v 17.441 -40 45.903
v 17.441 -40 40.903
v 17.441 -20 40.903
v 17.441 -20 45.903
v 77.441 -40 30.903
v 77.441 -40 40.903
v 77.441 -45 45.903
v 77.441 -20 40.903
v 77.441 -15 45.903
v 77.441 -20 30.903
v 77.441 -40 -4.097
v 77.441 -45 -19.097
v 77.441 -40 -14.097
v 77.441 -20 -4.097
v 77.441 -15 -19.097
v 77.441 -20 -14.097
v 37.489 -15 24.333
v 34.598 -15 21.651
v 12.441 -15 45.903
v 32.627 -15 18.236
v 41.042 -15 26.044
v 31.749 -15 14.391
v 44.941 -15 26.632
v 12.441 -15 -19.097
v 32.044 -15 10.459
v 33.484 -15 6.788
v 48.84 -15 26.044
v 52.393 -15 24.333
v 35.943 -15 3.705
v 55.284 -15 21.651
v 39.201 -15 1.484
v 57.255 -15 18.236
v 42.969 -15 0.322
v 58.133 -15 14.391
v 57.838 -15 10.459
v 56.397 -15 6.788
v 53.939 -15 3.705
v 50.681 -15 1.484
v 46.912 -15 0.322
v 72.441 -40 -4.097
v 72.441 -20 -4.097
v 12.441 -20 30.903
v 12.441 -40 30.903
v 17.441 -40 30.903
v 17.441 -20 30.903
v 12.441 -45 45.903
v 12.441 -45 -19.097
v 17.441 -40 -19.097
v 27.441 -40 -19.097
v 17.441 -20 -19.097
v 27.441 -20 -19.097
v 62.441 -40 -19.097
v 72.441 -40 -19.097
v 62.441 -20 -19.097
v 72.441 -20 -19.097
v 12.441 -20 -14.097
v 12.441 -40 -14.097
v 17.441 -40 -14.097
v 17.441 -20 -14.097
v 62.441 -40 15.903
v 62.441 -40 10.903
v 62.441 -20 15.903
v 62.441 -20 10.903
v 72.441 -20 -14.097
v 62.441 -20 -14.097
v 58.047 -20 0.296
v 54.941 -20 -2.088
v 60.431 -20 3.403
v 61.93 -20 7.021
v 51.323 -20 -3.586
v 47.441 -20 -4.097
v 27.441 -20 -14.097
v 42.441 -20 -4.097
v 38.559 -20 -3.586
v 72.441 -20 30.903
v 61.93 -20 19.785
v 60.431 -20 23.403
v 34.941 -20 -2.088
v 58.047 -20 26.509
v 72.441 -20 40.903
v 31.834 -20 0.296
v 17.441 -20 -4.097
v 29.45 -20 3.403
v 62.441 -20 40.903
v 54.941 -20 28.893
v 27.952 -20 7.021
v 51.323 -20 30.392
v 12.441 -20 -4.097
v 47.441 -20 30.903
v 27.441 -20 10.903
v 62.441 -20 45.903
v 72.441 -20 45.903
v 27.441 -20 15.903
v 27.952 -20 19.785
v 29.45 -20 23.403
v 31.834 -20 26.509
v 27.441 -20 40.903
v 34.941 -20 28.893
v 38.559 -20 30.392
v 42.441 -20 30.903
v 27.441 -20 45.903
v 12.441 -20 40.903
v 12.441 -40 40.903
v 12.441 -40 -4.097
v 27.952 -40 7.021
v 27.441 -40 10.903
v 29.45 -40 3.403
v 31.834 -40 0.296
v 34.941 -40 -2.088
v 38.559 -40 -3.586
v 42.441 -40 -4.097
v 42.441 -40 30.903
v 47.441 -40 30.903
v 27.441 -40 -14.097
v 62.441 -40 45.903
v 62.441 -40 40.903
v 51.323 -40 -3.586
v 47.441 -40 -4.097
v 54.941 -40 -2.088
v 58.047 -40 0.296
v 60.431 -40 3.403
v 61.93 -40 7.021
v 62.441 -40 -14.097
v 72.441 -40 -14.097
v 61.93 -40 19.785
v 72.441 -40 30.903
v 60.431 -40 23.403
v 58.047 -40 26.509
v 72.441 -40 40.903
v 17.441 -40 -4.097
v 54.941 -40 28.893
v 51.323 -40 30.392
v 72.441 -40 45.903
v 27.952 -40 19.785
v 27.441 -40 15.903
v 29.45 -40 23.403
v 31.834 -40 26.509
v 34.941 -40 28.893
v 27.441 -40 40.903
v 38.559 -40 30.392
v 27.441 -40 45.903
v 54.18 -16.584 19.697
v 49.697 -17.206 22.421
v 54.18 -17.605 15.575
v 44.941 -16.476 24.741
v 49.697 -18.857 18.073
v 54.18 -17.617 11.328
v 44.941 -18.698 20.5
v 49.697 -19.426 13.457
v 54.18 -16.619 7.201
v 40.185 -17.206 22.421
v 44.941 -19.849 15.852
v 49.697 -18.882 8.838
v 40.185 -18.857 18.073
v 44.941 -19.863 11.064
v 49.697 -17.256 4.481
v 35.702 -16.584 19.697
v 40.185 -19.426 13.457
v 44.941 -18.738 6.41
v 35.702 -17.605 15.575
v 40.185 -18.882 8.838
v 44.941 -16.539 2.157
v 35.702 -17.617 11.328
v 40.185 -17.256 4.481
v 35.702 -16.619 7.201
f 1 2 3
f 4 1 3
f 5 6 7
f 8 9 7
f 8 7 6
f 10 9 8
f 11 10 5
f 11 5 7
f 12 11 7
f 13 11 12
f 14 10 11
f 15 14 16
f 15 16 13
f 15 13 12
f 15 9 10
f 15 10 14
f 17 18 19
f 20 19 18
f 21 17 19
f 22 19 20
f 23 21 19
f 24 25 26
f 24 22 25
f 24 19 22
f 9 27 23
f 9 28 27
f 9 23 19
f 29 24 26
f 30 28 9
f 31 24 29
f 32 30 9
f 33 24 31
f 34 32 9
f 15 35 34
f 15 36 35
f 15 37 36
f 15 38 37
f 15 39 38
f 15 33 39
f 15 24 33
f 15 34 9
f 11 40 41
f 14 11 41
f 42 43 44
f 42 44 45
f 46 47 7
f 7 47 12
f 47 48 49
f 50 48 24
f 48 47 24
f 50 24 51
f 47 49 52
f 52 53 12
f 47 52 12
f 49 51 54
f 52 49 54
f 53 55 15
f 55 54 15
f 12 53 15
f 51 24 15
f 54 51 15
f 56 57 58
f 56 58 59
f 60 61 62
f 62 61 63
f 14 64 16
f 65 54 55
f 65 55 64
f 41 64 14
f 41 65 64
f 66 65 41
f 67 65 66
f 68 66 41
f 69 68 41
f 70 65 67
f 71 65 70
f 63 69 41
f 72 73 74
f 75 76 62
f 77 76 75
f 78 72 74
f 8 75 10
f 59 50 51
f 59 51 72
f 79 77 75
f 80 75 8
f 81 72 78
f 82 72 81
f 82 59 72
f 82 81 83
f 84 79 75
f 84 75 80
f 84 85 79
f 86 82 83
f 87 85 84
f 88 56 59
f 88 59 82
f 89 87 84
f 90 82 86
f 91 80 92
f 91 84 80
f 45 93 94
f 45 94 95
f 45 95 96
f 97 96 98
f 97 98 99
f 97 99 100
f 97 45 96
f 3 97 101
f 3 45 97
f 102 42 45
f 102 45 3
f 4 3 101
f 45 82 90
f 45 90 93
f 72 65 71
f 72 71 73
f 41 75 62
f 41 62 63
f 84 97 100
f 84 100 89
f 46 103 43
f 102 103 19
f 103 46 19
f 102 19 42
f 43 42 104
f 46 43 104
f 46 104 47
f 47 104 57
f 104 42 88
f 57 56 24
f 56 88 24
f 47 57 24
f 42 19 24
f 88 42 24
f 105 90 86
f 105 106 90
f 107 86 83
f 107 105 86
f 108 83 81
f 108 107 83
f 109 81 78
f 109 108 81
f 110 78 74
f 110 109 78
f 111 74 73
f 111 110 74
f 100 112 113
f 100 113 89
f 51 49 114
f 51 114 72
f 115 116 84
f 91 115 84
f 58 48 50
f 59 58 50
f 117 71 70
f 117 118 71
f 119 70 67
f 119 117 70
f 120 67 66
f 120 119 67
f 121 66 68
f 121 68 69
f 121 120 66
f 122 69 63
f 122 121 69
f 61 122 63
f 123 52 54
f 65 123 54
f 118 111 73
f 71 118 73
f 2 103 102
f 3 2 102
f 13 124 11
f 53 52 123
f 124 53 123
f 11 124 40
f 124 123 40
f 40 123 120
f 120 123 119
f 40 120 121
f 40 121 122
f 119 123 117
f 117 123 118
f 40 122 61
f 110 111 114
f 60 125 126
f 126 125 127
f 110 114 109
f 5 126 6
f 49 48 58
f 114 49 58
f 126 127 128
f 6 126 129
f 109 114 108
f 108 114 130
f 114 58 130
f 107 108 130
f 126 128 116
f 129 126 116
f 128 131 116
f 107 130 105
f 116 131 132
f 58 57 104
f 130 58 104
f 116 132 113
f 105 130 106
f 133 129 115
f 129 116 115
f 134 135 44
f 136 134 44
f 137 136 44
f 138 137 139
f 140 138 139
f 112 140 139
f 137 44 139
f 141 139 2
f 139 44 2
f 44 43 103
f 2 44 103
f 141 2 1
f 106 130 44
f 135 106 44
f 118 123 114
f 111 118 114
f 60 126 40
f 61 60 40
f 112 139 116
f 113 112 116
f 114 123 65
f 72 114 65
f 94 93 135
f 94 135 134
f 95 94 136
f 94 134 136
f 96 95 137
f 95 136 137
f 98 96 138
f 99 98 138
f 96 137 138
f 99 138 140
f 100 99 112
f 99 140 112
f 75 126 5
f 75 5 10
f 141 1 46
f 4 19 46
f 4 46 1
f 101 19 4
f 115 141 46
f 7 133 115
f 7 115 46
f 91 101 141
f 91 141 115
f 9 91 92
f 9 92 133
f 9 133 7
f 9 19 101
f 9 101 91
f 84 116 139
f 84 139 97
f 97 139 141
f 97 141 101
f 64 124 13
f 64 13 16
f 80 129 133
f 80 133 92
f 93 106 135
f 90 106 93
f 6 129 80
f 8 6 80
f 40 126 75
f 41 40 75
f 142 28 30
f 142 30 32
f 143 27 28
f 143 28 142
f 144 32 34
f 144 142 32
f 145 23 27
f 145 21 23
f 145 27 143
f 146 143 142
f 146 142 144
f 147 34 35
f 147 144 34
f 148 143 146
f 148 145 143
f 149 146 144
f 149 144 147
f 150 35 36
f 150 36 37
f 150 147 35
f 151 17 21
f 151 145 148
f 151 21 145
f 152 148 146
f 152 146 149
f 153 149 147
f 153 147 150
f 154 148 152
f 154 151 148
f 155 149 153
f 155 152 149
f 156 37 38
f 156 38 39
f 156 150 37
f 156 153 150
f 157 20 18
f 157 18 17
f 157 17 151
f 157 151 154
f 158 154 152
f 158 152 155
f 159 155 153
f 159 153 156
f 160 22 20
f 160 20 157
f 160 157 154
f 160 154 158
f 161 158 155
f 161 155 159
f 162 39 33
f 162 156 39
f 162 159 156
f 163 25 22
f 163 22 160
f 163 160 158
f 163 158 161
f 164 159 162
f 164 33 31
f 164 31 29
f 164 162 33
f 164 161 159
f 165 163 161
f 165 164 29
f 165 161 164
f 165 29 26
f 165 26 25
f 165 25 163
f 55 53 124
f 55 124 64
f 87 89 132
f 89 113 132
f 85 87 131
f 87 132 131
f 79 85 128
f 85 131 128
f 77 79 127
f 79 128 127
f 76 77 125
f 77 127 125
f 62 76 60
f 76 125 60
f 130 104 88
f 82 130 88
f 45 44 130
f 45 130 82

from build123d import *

# Parameters (mm, degrees)
SKETCH4_W           = 65
SKETCH4_H           = 65
BOSS_EXTRUDE2_DEPTH = 45
SKETCH6_W           = 65
SKETCH6_H           = 65
CUT_EXTRUDE2_DEPTH  = 15
SKETCH7_W           = 10
SKETCH7_H           = 20
CUT_EXTRUDE3_DEPTH  = 92.416994223
SKETCH8_W           = 10
SKETCH8_H           = 20
CUT_EXTRUDE4_DEPTH  = 111.666551289
FILLET1_R           = 15


with BuildPart() as part:
    # Sketch4 → Boss-Extrude2 (new body)
    with BuildSketch(Plane(origin=(0, 0, 0), x_dir=(1, 0, 0), z_dir=(0, 1, 0))):
        with Locations((44.940852102, -13.402797658)):
            Rectangle(SKETCH4_W, SKETCH4_H)
    extrude(amount=-BOSS_EXTRUDE2_DEPTH)

    # Sketch5 → Cut-Revolve2 (revolve, cut)
    with BuildSketch(Plane(origin=(0, 0, 0), x_dir=(1, 0, 0), z_dir=(0, 1, 0))):
        with BuildLine():
            Line((24.940852102, -13.402797658), (64.940852102, -13.402797658))
            ThreePointArc((64.940852102, -13.402797658), (44.940852102, 6.597202342), (24.940852102, -13.402797658))
        make_face()
    revolve(axis=Axis((24.940852102, 0, 13.402797658), (1, 0, 0)), mode=Mode.SUBTRACT)

    # Sketch6 → Cut-Extrude2 (cut)
    with BuildSketch(Plane(origin=(0, 0, 0), x_dir=(1, 0, 0), z_dir=(0, 1, 0))):
        with Locations((44.940852102, -13.402797658)):
            Rectangle(SKETCH6_W, SKETCH6_H)
    extrude(amount=-CUT_EXTRUDE2_DEPTH, mode=Mode.SUBTRACT)

    # Sketch7 → Cut-Extrude3 (cut, through all)
    with BuildSketch(Plane.ZY.offset(-12.440852102)):
        with Locations((-9.097202342, -30)):
            Rectangle(SKETCH7_W, SKETCH7_H)
        with Locations((35.902797658, -30)):
            Rectangle(SKETCH7_W, SKETCH7_H)
    extrude(amount=-CUT_EXTRUDE3_DEPTH, mode=Mode.SUBTRACT)

    # Sketch8 → Cut-Extrude4 (cut, through all)
    with BuildSketch(Plane(origin=(0, 0, -19.097202342), x_dir=(-1, 0, 0), z_dir=(0, 0, -1))):
        with Locations((-67.440852102, -30)):
            Rectangle(SKETCH8_W, SKETCH8_H)
        with Locations((-22.440852102, -30)):
            Rectangle(SKETCH8_W, SKETCH8_H)
    extrude(amount=-CUT_EXTRUDE4_DEPTH, mode=Mode.SUBTRACT)

    # Fillet1
    fillet1_edges = [part.edges().sort_by_distance(p)[0] for p in [
        (27.440852102, -30, 30.902797658),
        (27.440852102, -30, -4.097202342),
        (62.440852102, -30, 30.902797658),
        (62.440852102, -30, -4.097202342),
    ]]
    fillet(fillet1_edges, radius=FILLET1_R)


solid = part.part
